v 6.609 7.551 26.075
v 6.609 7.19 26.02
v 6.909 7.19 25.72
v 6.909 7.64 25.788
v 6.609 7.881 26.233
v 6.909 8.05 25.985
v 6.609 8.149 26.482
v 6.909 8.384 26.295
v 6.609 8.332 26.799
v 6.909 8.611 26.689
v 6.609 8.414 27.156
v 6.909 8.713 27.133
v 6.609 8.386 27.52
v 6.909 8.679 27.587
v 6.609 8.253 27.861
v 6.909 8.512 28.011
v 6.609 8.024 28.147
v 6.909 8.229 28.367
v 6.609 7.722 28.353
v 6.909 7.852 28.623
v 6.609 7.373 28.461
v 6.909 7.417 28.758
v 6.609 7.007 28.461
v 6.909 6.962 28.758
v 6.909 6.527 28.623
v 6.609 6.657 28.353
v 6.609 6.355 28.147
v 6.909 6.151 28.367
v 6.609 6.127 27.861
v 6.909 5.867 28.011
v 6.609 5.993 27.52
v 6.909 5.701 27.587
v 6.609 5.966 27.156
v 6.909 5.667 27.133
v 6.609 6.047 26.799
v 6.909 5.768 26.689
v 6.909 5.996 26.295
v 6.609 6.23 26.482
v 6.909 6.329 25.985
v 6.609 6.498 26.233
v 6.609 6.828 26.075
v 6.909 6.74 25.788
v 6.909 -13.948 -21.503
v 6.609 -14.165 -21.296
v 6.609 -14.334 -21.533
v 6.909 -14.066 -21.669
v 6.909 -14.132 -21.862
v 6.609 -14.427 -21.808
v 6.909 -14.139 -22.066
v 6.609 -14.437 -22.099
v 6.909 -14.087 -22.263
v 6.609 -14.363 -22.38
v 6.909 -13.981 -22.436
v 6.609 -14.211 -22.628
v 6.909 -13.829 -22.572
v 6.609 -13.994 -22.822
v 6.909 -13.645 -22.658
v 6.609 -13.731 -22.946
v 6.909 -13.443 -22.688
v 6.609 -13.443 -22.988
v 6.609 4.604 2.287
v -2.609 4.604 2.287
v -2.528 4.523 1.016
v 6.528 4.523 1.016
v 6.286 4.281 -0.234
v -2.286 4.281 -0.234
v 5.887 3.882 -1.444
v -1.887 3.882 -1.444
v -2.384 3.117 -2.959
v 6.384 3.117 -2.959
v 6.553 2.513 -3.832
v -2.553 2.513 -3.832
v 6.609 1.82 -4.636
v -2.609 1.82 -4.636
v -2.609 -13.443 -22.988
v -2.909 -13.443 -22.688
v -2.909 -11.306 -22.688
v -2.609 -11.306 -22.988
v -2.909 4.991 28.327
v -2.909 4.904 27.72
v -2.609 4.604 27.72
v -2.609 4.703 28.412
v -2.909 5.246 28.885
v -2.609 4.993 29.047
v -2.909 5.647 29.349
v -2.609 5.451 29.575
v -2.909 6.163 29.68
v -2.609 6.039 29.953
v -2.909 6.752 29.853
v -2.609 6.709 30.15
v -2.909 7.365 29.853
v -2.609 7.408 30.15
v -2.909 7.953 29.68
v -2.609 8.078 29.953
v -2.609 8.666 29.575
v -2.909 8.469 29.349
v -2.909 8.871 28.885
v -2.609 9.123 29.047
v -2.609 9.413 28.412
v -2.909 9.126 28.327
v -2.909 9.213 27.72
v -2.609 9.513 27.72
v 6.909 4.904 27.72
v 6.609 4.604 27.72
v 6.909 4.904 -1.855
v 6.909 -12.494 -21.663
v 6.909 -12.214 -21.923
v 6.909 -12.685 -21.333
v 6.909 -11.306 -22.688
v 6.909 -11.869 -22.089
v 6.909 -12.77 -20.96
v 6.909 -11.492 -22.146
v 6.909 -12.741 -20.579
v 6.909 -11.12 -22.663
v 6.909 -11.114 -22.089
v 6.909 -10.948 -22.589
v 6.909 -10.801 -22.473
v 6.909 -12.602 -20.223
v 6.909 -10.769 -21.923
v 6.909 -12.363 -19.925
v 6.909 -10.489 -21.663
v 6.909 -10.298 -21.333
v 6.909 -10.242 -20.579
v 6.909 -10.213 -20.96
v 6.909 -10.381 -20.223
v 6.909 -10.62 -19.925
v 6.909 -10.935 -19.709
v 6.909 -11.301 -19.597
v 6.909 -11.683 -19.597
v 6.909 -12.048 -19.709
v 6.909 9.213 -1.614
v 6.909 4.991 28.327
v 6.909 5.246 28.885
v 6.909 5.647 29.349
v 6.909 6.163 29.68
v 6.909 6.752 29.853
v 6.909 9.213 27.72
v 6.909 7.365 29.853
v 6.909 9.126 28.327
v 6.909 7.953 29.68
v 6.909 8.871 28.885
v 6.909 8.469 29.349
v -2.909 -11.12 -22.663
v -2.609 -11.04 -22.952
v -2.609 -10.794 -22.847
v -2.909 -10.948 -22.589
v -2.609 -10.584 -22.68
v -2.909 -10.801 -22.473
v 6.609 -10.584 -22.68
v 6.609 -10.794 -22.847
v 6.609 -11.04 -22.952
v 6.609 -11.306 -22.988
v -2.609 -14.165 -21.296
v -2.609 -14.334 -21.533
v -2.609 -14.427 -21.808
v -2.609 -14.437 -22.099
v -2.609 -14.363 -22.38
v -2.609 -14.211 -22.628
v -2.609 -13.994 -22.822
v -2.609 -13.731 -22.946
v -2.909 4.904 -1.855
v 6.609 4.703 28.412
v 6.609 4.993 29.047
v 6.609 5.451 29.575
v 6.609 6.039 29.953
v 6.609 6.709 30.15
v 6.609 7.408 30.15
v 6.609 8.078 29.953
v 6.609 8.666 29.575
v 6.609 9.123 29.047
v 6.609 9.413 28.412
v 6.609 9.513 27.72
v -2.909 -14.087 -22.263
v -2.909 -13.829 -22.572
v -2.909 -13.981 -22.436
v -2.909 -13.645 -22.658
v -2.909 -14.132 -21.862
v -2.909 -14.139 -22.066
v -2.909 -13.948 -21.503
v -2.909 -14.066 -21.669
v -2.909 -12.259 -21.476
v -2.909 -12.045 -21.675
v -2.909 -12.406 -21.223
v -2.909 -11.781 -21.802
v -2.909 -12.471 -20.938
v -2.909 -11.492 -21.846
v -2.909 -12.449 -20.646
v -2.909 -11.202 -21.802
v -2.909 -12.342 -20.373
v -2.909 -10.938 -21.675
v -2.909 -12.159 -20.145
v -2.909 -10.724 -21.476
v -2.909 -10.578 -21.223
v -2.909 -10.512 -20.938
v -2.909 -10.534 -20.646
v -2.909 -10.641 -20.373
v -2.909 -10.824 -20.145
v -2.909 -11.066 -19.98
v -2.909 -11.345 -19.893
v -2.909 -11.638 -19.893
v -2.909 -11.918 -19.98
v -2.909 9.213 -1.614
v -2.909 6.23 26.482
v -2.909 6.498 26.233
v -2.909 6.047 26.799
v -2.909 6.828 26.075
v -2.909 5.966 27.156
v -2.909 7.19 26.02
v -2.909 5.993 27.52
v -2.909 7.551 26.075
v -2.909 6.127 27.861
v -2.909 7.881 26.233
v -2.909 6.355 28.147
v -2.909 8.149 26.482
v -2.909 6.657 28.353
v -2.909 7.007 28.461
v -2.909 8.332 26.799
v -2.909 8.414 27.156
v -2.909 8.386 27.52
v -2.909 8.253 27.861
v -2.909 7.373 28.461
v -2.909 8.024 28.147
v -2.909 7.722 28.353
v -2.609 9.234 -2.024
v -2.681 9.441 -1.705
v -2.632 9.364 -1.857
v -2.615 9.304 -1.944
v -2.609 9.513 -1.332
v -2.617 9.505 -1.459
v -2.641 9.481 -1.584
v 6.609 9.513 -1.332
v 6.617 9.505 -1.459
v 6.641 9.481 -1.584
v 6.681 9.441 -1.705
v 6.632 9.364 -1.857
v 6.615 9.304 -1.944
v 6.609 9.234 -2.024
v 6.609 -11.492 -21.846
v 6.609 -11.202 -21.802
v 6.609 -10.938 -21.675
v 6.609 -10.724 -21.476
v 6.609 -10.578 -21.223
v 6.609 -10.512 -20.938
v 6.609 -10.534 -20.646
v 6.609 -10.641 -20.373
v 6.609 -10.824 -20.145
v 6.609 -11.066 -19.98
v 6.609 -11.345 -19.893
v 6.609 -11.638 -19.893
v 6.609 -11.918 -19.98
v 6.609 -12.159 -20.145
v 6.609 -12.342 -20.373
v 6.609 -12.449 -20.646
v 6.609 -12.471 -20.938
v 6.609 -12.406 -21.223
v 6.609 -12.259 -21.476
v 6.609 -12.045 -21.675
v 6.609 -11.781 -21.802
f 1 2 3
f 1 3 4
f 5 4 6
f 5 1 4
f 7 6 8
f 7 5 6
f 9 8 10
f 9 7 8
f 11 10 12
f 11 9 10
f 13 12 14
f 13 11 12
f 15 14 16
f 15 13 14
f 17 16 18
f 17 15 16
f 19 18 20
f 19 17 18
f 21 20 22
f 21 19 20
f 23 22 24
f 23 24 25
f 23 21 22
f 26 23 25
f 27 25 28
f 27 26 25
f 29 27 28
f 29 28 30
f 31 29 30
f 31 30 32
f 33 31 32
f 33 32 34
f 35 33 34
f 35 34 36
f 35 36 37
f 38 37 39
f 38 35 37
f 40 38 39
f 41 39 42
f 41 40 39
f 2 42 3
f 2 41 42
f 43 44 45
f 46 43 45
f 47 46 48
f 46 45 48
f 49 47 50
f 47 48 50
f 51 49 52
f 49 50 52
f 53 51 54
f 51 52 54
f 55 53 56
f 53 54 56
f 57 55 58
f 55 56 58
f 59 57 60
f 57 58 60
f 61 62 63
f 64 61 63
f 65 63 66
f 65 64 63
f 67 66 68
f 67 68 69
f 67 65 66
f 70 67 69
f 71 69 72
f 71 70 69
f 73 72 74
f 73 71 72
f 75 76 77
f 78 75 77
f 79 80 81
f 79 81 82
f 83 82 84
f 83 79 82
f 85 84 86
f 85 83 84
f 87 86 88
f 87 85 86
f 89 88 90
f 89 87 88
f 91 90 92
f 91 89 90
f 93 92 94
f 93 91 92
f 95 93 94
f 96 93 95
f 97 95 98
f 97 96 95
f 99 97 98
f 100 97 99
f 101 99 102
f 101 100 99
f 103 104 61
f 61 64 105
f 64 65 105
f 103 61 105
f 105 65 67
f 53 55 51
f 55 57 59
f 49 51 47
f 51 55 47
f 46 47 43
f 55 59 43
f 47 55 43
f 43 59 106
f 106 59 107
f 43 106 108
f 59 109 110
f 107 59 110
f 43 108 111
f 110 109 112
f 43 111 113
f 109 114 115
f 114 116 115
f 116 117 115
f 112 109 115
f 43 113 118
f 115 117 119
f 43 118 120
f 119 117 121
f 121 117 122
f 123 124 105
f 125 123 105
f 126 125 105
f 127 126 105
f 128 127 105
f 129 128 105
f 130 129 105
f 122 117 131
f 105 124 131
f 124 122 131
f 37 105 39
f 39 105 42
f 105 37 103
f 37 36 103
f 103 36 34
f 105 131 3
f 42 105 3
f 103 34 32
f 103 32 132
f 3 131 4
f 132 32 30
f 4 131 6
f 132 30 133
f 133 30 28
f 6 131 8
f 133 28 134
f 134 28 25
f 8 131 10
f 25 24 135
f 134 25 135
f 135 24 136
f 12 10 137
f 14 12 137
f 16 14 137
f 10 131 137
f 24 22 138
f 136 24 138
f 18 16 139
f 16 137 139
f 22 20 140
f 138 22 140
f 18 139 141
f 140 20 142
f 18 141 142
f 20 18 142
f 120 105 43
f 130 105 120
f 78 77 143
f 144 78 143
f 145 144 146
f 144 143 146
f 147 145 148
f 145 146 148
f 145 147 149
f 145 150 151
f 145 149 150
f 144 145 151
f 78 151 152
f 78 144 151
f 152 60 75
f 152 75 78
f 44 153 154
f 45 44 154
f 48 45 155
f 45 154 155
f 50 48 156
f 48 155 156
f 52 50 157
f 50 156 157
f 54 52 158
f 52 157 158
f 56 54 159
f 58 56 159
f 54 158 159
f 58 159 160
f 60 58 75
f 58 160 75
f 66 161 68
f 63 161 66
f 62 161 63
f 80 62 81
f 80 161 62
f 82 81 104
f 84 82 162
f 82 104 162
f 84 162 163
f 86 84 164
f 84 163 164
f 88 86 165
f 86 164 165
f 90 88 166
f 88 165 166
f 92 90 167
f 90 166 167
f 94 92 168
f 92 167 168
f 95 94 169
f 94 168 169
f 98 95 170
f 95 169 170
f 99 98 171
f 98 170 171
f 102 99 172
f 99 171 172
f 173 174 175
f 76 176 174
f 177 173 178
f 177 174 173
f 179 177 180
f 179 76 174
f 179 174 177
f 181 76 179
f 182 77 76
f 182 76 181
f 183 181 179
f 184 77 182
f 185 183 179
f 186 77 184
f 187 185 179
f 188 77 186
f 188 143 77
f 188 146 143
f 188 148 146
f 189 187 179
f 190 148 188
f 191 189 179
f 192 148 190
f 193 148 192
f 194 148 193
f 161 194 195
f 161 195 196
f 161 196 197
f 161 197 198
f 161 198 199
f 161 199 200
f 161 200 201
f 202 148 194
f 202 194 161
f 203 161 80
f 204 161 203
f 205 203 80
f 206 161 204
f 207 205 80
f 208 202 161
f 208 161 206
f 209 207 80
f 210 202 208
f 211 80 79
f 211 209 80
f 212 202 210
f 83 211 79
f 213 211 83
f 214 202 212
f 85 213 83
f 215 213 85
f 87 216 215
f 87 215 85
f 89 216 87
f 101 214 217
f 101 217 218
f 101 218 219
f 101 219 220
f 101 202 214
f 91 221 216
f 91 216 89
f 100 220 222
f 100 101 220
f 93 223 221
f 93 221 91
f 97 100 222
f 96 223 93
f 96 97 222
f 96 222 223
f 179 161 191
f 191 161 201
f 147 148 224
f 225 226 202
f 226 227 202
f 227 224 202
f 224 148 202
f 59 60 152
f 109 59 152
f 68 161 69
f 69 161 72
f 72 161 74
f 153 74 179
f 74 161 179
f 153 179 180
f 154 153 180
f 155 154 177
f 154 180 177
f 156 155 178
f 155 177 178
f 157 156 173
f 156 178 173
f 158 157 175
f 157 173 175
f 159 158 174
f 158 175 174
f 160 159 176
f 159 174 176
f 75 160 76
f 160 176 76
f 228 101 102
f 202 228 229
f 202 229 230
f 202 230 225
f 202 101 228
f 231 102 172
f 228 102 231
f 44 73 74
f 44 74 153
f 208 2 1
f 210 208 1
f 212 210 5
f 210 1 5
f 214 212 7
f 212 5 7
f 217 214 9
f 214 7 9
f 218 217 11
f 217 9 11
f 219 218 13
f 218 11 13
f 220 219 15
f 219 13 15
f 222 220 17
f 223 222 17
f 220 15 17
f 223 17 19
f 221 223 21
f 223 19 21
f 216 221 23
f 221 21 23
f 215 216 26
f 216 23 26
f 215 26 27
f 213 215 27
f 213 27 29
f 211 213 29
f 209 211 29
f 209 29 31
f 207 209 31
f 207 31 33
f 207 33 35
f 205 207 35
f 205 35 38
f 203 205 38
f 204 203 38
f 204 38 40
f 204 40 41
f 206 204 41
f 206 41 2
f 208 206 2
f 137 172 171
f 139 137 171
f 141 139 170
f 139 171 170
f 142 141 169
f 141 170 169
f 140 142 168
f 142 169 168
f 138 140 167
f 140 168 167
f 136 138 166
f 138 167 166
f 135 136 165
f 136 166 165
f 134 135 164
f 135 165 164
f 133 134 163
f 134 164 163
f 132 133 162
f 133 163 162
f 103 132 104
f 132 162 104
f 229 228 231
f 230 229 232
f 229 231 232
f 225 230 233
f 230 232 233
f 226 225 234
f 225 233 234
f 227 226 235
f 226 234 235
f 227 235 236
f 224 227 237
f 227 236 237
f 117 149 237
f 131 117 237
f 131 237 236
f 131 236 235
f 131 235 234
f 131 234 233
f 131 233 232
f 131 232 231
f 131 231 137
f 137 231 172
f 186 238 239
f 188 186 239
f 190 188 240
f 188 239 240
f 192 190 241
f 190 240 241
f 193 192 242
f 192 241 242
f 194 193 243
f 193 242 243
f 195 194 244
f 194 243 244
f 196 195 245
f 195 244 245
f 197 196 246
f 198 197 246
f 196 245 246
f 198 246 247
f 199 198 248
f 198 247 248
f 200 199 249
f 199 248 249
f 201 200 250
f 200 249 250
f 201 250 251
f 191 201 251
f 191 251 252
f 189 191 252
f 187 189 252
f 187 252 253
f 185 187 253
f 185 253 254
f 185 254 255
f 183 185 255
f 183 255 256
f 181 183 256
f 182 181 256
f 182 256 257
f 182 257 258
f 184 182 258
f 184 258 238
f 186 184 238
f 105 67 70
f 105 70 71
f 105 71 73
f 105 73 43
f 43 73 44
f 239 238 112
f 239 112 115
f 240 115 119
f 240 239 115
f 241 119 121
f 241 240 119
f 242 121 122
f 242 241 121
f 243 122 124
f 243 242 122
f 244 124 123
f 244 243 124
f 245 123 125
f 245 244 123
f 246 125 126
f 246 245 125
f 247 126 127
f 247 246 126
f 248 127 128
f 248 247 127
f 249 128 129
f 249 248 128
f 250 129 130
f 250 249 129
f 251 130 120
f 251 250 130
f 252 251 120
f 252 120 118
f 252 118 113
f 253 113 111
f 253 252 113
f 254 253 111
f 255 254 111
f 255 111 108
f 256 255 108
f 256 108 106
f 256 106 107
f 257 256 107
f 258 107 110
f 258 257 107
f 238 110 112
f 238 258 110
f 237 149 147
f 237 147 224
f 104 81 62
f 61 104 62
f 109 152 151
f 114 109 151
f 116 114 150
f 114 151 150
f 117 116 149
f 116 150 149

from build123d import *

# Parameters (mm, degrees)
SKETCH_1_W          = 12
SKETCH_1_H          = 2
EXTRUDE_1_DEPTH     = 4
EXTRUDE_2_DEPTH     = 4
EXTRUDE_4_DEPTH     = 4
SKETCH_8_R          = 0.5
CUT_EXTRUDE_1_DEPTH = 10
SKETCH_9_R          = 0.4
CUT_EXTRUDE_2_DEPTH = 10
SCALE_1_SCALE       = 2.454545455
FILLET_1_R          = 1
CHAMFER_1_SIZE      = 0.3
FILLET_2_R          = 1
FILLET_3_R          = 10


with BuildPart() as part:
    # 草图1 → 凸台-拉伸1 (new body)
    with BuildSketch(Plane(origin=(0, 0, 0), x_dir=(0, 0, -1), z_dir=(1, 0, 0))):
        with Locations((-7.174242424, 4.674378087)):
            Rectangle(SKETCH_1_W, SKETCH_1_H)
    extrude(amount=EXTRUDE_1_DEPTH)

    # 草图4 → 凸台-拉伸2 (add)
    with BuildSketch(Plane(origin=(4, 0, 0), x_dir=(0, 0, -1), z_dir=(1, 0, 0))):
        Polygon((-1.174242424, 5.674378087), (-1.174242424, 3.674378087), (7.484707821, -4.633604859), (7.484707821, -2.633604859), align=None)
    extrude(amount=-EXTRUDE_2_DEPTH)

    # 草图7 → 凸台-拉伸4 (add)
    with BuildSketch(Plane(origin=(4, 0, 0), x_dir=(0, 0, -1), z_dir=(1, 0, 0))):
        with BuildLine():
            Line((-13.174242424, 5.674378087), (-13.174242424, 3.674378087))
            ThreePointArc((-13.174242424, 3.674378087), (-14.174242424, 4.674378087), (-13.174242424, 5.674378087))
        make_face()
    extrude(amount=-EXTRUDE_4_DEPTH)

    # 草图8 → 切除-拉伸1 (cut)
    with BuildSketch(Plane(origin=(4, 0, 0), x_dir=(0, 0, -1), z_dir=(1, 0, 0))):
        with Locations((-12.981538842, 4.72790686)):
            Circle(SKETCH_8_R)
    extrude(amount=-CUT_EXTRUDE_1_DEPTH, mode=Mode.SUBTRACT)

    # 草图9 → 切除-拉伸2 (cut)
    with BuildSketch(Plane(origin=(4, 0, 0), x_dir=(0, 0, -1), z_dir=(1, 0, 0))):
        with Locations((6.619490877, -2.882976322)):
            Circle(SKETCH_9_R)
    extrude(amount=-CUT_EXTRUDE_2_DEPTH, mode=Mode.SUBTRACT)


with BuildPart() as part_1:
    # 缩放比例1: scaled about (2, 3.035419998, 3.173801188)
    add(part.part.scale(SCALE_1_SCALE).moved(Location((-2.909090909, -4.415156361, -4.616438092))))

    # 圆角1
    fillet_1_edges = [part_1.edges().sort_by_distance(p)[0] for p in [
        (2, -10.879459197, -22.987993653),
        (2, -15.788550106, -22.987993653),
    ]]
    fillet(fillet_1_edges, radius=FILLET_1_R)

    # 倒角1
    chamfer_1_edges = [part_1.edges().sort_by_distance(p)[0] for p in [
        (-2.909090909, -4.780520326, -11.514934214),
        (6.909090909, 4.603771672, 12.993066041),
        (6.909090909, -4.780520326, -11.514934214),
        (-2.909090909, 7.058317127, 30.174884222),
        (6.909090909, 7.058317127, 30.174884222),
        (6.909090909, 7.189705933, 28.474611794),
        (6.909090909, -11.491552788, -19.882461153),
        (6.909090909, -12.374536967, -22.987993653),
        (-2.909090909, -12.374536967, -22.987993653),
        (-2.909090909, 4.603771672, 12.993066041),
        (6.909090909, -0.535699514, -12.207266126),
        (6.909090909, -14.36310593, -22.380210486),
        (6.909090909, -10.913623963, -22.907866447),
        (-2.909090909, -0.535699514, -12.207266126),
        (-2.909090909, -14.36310593, -22.380210486),
        (-2.909090909, -10.913623963, -22.907866447),
        (-2.909090909, 9.512862581, 12.993066041),
        (6.909090909, 9.512862581, 12.993066041),
    ]]
    chamfer(chamfer_1_edges, length=CHAMFER_1_SIZE)

    # 圆角2
    fillet_2_edges = [part_1.edges().sort_by_distance(p)[0] for p in [
        (2, 9.512862581, -1.734206687),
    ]]
    fillet(fillet_2_edges, radius=FILLET_2_R)

    # 圆角3
    fillet_3_edges = [part_1.edges().sort_by_distance(p)[0] for p in [
        (2, 4.603771672, -1.734206687),
    ]]
    fillet(fillet_3_edges, radius=FILLET_3_R)


solid = part_1.part
